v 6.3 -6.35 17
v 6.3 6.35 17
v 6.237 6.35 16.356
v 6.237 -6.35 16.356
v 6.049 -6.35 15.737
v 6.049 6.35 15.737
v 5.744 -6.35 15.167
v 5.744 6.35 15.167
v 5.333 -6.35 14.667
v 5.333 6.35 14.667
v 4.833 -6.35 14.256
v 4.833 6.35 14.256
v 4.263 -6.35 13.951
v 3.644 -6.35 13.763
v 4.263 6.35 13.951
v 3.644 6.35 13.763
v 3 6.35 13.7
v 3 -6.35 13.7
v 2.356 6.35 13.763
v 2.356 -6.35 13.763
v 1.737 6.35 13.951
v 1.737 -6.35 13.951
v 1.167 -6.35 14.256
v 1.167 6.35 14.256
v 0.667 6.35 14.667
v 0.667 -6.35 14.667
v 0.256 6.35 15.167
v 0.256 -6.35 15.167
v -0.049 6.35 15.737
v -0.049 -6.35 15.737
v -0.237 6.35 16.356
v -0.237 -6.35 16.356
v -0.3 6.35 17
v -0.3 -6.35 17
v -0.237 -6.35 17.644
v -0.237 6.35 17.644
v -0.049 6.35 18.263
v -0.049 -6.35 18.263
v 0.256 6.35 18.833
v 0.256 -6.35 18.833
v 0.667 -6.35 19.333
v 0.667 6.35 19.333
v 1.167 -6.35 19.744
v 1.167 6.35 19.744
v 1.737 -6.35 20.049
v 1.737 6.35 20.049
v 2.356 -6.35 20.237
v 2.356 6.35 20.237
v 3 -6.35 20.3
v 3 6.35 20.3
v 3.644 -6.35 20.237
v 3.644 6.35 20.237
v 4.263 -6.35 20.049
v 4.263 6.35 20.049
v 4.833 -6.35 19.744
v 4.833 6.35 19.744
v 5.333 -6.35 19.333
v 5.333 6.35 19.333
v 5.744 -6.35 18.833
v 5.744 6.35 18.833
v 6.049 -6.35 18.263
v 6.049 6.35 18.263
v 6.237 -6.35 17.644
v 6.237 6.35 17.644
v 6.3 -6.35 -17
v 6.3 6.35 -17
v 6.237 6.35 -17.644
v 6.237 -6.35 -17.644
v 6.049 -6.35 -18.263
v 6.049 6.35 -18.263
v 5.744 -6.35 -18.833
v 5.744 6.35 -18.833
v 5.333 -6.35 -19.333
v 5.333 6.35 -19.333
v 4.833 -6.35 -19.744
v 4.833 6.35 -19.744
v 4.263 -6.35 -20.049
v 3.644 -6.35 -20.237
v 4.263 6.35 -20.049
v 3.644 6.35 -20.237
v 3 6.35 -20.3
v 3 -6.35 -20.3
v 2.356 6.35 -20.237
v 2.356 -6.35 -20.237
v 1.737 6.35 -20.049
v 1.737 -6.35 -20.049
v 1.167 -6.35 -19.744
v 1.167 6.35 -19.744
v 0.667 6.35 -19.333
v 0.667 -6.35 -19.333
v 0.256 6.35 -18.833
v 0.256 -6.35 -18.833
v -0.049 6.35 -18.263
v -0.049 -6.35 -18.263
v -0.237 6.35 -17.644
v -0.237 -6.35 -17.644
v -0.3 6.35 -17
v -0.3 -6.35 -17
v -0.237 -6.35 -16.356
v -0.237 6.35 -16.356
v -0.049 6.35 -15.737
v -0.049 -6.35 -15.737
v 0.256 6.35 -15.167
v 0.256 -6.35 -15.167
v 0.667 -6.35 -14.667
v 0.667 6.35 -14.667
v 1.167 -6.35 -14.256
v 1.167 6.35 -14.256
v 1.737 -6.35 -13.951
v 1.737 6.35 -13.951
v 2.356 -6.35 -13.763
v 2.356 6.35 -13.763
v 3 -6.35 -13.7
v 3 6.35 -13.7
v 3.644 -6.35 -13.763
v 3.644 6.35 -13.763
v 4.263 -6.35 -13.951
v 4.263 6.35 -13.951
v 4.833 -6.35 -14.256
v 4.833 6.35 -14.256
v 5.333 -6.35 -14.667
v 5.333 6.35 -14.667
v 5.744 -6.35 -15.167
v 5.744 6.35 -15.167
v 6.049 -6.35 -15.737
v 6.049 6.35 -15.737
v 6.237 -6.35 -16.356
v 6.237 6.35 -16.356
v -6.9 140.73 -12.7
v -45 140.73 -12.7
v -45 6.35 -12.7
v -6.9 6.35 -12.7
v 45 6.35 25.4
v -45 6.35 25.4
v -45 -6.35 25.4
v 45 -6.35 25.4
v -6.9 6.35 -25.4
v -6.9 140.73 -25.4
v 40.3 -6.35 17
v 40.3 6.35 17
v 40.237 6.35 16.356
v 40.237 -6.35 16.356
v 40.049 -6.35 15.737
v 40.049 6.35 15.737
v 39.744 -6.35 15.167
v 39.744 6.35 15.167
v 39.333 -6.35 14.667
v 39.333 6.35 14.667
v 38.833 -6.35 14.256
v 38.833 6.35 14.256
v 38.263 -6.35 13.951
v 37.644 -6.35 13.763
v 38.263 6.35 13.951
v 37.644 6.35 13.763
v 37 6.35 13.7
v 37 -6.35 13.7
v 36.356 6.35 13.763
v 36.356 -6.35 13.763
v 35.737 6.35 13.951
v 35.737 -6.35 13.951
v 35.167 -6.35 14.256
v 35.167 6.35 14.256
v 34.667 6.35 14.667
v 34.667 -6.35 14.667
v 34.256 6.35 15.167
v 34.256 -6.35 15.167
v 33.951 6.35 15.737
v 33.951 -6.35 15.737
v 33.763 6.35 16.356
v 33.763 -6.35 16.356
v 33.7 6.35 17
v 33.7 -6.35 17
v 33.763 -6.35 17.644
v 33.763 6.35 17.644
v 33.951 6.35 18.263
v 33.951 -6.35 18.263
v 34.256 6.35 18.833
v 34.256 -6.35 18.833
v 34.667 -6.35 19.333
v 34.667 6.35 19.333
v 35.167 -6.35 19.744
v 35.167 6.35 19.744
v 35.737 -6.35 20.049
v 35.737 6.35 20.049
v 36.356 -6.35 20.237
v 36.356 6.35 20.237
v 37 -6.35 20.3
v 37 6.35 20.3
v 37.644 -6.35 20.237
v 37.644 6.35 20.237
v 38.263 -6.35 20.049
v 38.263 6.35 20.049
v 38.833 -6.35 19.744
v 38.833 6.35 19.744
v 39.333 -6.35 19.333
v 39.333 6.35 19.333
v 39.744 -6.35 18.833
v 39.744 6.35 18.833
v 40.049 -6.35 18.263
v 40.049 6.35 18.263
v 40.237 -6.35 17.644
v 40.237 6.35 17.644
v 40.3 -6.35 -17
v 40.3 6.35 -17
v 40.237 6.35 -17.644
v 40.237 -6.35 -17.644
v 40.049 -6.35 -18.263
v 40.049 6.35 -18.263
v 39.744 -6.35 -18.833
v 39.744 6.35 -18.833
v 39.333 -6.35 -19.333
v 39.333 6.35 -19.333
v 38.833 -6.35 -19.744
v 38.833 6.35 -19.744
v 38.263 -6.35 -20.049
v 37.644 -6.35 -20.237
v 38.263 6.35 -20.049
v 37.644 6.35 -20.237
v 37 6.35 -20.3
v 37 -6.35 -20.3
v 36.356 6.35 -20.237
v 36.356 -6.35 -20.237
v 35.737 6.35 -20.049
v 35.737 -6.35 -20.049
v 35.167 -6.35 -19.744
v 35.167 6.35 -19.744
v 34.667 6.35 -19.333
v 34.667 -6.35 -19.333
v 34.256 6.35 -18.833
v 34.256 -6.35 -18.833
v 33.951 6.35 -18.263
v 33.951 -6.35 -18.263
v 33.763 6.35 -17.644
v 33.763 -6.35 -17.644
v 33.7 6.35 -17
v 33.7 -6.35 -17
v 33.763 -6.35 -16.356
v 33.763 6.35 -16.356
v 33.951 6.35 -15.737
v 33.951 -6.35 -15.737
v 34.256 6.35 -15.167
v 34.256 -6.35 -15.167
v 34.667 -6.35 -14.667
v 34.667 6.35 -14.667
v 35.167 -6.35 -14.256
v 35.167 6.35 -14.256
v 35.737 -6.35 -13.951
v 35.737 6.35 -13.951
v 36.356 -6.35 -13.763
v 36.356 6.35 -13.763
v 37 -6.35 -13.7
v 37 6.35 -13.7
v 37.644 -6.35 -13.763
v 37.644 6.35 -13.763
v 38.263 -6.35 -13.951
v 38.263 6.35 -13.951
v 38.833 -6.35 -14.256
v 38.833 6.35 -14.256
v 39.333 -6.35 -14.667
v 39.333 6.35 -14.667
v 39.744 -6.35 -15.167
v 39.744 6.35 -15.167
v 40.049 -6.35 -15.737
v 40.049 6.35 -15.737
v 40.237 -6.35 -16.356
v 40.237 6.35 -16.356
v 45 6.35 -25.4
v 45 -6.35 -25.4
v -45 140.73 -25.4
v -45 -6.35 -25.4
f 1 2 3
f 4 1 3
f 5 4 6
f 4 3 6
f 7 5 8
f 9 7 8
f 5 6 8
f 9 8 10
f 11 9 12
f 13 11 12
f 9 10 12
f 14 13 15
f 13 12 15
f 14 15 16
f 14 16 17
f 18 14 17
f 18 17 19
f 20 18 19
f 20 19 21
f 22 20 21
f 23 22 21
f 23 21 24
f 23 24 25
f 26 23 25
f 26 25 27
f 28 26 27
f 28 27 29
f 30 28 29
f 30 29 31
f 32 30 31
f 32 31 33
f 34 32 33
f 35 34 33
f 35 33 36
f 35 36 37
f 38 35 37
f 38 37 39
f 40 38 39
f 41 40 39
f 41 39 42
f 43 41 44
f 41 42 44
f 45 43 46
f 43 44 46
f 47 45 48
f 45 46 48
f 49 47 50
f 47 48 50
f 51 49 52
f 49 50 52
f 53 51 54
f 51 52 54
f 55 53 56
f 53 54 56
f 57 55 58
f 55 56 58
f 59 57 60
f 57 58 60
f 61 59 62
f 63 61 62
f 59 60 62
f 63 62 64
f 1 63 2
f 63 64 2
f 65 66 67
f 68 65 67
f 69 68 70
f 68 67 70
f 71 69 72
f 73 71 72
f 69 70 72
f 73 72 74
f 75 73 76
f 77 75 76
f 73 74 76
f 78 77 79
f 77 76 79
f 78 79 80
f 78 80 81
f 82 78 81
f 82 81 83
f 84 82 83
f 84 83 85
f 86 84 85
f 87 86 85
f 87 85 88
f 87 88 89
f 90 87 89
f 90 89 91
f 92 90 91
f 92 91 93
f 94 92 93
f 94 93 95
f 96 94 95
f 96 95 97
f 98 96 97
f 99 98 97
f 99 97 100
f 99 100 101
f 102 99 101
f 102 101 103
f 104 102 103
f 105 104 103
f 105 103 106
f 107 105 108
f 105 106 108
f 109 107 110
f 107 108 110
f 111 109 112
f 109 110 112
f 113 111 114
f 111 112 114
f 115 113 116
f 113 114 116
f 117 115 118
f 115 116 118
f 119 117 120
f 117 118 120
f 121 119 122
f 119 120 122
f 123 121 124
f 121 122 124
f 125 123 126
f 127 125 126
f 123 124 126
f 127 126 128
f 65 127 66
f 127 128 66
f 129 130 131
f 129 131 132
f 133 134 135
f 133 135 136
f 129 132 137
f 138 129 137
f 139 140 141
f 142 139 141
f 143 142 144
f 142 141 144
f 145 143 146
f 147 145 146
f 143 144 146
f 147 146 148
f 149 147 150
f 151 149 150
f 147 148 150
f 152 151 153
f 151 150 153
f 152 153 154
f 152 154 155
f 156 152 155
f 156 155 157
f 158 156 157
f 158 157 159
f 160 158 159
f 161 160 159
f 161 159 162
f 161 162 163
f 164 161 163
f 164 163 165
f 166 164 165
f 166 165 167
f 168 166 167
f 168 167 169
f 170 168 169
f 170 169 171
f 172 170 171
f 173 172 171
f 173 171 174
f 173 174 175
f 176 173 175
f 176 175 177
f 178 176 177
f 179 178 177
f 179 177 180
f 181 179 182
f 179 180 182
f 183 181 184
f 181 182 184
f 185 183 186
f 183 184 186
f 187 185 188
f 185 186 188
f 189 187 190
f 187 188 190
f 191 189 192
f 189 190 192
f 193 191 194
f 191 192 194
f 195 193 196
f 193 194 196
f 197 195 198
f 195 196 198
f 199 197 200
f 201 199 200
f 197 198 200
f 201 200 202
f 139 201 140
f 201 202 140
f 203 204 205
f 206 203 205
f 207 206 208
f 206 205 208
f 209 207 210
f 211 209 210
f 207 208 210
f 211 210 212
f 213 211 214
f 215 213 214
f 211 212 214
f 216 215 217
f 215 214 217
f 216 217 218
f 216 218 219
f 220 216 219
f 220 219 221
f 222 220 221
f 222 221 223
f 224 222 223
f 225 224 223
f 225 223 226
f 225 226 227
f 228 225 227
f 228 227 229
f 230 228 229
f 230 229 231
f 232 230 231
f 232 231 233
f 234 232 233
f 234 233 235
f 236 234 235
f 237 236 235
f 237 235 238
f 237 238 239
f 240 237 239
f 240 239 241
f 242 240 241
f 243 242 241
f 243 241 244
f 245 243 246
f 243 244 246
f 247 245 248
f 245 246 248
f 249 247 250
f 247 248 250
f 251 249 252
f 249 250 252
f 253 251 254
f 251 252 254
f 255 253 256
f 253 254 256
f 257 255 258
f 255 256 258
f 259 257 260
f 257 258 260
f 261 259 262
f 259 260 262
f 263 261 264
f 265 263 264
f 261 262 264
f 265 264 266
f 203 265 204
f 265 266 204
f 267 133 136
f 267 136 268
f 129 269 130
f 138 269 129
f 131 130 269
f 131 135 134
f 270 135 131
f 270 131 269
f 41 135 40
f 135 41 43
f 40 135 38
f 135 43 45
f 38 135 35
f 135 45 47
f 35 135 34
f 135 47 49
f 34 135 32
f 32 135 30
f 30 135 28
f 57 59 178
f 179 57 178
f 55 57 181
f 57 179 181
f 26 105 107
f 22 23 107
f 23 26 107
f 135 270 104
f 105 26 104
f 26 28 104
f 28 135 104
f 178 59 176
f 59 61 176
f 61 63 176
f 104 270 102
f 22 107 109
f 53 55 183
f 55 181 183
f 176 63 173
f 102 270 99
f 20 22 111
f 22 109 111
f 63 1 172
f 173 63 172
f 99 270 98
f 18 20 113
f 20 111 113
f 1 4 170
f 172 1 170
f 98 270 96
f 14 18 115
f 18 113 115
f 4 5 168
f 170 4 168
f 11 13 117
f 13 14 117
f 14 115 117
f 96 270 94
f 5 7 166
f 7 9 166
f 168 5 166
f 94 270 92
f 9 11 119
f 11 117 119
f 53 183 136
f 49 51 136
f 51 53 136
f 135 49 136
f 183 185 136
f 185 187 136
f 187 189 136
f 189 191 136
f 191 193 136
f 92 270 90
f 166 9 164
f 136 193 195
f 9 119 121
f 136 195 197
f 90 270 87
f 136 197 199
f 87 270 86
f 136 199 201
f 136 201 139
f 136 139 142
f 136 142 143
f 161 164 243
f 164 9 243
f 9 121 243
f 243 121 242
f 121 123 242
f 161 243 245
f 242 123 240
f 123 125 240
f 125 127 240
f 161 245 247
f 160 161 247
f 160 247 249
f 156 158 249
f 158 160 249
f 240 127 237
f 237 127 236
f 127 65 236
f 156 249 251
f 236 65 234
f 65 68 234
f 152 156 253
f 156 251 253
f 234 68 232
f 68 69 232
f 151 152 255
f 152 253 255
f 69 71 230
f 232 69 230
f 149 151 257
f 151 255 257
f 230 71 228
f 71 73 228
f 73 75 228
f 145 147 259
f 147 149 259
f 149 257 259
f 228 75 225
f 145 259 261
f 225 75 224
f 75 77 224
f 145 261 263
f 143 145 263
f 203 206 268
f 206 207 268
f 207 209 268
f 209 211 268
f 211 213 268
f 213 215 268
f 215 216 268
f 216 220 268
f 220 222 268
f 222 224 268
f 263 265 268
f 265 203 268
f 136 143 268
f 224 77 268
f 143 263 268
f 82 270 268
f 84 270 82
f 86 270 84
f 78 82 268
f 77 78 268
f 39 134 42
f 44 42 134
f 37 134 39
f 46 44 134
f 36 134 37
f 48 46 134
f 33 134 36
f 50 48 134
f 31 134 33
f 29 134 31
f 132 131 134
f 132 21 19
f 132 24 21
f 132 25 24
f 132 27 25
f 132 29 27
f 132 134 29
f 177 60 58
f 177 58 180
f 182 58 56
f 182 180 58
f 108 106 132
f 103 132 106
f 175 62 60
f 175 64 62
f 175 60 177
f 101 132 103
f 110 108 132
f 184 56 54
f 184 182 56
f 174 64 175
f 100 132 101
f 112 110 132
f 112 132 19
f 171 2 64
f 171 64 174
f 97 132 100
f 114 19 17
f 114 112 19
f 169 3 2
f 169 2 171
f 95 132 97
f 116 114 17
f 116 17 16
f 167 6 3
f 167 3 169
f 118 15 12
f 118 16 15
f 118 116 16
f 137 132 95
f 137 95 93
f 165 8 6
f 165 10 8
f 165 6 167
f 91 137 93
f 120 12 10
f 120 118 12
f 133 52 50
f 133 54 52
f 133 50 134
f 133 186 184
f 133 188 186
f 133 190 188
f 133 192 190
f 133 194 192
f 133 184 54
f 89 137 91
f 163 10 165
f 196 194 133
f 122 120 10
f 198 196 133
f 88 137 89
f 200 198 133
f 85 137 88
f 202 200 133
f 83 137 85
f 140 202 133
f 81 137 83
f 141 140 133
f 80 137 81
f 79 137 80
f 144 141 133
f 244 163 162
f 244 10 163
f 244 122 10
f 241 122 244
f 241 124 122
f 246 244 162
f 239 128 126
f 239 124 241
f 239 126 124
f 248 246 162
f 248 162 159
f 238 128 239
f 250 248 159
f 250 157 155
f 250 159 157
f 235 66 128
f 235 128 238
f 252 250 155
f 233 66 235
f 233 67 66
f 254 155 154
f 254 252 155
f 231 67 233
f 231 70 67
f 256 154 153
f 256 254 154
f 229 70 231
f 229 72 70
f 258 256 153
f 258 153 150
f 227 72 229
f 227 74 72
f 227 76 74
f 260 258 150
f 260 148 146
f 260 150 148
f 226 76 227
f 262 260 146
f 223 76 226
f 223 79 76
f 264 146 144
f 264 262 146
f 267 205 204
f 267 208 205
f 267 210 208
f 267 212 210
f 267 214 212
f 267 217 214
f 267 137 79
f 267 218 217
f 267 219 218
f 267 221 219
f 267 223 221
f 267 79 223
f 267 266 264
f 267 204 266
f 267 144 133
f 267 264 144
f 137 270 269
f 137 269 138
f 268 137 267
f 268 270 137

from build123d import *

# Parameters (mm, degrees)
CROQUIS1_W                   = 90
CROQUIS1_H                   = 50.8
SALIENTE_EXTRUIR1_DEPTH      = 6.35
TALADRO_DE_MARGEN_PARA_M61_D = 6.6
CROQUIS4_W                   = 38.1
CROQUIS4_H                   = 12.7
SALIENTE_EXTRUIR2_DEPTH      = 134.38


with BuildPart() as part:
    # Croquis1 → Saliente-Extruir1 (new, symmetric)
    with BuildSketch(Plane(origin=(0, 0, 0), x_dir=(1, 0, 0), z_dir=(0, 1, 0))):
        Rectangle(CROQUIS1_W, CROQUIS1_H)
    extrude(amount=SALIENTE_EXTRUIR1_DEPTH, both=True)

    # Taladro de margen para M61 (through all)
    with Locations(Plane(origin=(0, -6.35, 0), x_dir=(-1, 0, 0), z_dir=(0, -1, 0))):
        with Locations((-36.583684882, -75.725395139), (-37, -17), (-37, 17), (-3, -17), (-3, 17)):
            Hole(TALADRO_DE_MARGEN_PARA_M61_D / 2)

    # Croquis4 → Saliente-Extruir2 (add)
    with BuildSketch(Plane(origin=(0, 6.35, 0), x_dir=(1, 0, 0), z_dir=(0, 1, 0))):
        with Locations((-25.95, 19.05)):
            Rectangle(CROQUIS4_W, CROQUIS4_H)
    extrude(amount=SALIENTE_EXTRUIR2_DEPTH)


solid = part.part
